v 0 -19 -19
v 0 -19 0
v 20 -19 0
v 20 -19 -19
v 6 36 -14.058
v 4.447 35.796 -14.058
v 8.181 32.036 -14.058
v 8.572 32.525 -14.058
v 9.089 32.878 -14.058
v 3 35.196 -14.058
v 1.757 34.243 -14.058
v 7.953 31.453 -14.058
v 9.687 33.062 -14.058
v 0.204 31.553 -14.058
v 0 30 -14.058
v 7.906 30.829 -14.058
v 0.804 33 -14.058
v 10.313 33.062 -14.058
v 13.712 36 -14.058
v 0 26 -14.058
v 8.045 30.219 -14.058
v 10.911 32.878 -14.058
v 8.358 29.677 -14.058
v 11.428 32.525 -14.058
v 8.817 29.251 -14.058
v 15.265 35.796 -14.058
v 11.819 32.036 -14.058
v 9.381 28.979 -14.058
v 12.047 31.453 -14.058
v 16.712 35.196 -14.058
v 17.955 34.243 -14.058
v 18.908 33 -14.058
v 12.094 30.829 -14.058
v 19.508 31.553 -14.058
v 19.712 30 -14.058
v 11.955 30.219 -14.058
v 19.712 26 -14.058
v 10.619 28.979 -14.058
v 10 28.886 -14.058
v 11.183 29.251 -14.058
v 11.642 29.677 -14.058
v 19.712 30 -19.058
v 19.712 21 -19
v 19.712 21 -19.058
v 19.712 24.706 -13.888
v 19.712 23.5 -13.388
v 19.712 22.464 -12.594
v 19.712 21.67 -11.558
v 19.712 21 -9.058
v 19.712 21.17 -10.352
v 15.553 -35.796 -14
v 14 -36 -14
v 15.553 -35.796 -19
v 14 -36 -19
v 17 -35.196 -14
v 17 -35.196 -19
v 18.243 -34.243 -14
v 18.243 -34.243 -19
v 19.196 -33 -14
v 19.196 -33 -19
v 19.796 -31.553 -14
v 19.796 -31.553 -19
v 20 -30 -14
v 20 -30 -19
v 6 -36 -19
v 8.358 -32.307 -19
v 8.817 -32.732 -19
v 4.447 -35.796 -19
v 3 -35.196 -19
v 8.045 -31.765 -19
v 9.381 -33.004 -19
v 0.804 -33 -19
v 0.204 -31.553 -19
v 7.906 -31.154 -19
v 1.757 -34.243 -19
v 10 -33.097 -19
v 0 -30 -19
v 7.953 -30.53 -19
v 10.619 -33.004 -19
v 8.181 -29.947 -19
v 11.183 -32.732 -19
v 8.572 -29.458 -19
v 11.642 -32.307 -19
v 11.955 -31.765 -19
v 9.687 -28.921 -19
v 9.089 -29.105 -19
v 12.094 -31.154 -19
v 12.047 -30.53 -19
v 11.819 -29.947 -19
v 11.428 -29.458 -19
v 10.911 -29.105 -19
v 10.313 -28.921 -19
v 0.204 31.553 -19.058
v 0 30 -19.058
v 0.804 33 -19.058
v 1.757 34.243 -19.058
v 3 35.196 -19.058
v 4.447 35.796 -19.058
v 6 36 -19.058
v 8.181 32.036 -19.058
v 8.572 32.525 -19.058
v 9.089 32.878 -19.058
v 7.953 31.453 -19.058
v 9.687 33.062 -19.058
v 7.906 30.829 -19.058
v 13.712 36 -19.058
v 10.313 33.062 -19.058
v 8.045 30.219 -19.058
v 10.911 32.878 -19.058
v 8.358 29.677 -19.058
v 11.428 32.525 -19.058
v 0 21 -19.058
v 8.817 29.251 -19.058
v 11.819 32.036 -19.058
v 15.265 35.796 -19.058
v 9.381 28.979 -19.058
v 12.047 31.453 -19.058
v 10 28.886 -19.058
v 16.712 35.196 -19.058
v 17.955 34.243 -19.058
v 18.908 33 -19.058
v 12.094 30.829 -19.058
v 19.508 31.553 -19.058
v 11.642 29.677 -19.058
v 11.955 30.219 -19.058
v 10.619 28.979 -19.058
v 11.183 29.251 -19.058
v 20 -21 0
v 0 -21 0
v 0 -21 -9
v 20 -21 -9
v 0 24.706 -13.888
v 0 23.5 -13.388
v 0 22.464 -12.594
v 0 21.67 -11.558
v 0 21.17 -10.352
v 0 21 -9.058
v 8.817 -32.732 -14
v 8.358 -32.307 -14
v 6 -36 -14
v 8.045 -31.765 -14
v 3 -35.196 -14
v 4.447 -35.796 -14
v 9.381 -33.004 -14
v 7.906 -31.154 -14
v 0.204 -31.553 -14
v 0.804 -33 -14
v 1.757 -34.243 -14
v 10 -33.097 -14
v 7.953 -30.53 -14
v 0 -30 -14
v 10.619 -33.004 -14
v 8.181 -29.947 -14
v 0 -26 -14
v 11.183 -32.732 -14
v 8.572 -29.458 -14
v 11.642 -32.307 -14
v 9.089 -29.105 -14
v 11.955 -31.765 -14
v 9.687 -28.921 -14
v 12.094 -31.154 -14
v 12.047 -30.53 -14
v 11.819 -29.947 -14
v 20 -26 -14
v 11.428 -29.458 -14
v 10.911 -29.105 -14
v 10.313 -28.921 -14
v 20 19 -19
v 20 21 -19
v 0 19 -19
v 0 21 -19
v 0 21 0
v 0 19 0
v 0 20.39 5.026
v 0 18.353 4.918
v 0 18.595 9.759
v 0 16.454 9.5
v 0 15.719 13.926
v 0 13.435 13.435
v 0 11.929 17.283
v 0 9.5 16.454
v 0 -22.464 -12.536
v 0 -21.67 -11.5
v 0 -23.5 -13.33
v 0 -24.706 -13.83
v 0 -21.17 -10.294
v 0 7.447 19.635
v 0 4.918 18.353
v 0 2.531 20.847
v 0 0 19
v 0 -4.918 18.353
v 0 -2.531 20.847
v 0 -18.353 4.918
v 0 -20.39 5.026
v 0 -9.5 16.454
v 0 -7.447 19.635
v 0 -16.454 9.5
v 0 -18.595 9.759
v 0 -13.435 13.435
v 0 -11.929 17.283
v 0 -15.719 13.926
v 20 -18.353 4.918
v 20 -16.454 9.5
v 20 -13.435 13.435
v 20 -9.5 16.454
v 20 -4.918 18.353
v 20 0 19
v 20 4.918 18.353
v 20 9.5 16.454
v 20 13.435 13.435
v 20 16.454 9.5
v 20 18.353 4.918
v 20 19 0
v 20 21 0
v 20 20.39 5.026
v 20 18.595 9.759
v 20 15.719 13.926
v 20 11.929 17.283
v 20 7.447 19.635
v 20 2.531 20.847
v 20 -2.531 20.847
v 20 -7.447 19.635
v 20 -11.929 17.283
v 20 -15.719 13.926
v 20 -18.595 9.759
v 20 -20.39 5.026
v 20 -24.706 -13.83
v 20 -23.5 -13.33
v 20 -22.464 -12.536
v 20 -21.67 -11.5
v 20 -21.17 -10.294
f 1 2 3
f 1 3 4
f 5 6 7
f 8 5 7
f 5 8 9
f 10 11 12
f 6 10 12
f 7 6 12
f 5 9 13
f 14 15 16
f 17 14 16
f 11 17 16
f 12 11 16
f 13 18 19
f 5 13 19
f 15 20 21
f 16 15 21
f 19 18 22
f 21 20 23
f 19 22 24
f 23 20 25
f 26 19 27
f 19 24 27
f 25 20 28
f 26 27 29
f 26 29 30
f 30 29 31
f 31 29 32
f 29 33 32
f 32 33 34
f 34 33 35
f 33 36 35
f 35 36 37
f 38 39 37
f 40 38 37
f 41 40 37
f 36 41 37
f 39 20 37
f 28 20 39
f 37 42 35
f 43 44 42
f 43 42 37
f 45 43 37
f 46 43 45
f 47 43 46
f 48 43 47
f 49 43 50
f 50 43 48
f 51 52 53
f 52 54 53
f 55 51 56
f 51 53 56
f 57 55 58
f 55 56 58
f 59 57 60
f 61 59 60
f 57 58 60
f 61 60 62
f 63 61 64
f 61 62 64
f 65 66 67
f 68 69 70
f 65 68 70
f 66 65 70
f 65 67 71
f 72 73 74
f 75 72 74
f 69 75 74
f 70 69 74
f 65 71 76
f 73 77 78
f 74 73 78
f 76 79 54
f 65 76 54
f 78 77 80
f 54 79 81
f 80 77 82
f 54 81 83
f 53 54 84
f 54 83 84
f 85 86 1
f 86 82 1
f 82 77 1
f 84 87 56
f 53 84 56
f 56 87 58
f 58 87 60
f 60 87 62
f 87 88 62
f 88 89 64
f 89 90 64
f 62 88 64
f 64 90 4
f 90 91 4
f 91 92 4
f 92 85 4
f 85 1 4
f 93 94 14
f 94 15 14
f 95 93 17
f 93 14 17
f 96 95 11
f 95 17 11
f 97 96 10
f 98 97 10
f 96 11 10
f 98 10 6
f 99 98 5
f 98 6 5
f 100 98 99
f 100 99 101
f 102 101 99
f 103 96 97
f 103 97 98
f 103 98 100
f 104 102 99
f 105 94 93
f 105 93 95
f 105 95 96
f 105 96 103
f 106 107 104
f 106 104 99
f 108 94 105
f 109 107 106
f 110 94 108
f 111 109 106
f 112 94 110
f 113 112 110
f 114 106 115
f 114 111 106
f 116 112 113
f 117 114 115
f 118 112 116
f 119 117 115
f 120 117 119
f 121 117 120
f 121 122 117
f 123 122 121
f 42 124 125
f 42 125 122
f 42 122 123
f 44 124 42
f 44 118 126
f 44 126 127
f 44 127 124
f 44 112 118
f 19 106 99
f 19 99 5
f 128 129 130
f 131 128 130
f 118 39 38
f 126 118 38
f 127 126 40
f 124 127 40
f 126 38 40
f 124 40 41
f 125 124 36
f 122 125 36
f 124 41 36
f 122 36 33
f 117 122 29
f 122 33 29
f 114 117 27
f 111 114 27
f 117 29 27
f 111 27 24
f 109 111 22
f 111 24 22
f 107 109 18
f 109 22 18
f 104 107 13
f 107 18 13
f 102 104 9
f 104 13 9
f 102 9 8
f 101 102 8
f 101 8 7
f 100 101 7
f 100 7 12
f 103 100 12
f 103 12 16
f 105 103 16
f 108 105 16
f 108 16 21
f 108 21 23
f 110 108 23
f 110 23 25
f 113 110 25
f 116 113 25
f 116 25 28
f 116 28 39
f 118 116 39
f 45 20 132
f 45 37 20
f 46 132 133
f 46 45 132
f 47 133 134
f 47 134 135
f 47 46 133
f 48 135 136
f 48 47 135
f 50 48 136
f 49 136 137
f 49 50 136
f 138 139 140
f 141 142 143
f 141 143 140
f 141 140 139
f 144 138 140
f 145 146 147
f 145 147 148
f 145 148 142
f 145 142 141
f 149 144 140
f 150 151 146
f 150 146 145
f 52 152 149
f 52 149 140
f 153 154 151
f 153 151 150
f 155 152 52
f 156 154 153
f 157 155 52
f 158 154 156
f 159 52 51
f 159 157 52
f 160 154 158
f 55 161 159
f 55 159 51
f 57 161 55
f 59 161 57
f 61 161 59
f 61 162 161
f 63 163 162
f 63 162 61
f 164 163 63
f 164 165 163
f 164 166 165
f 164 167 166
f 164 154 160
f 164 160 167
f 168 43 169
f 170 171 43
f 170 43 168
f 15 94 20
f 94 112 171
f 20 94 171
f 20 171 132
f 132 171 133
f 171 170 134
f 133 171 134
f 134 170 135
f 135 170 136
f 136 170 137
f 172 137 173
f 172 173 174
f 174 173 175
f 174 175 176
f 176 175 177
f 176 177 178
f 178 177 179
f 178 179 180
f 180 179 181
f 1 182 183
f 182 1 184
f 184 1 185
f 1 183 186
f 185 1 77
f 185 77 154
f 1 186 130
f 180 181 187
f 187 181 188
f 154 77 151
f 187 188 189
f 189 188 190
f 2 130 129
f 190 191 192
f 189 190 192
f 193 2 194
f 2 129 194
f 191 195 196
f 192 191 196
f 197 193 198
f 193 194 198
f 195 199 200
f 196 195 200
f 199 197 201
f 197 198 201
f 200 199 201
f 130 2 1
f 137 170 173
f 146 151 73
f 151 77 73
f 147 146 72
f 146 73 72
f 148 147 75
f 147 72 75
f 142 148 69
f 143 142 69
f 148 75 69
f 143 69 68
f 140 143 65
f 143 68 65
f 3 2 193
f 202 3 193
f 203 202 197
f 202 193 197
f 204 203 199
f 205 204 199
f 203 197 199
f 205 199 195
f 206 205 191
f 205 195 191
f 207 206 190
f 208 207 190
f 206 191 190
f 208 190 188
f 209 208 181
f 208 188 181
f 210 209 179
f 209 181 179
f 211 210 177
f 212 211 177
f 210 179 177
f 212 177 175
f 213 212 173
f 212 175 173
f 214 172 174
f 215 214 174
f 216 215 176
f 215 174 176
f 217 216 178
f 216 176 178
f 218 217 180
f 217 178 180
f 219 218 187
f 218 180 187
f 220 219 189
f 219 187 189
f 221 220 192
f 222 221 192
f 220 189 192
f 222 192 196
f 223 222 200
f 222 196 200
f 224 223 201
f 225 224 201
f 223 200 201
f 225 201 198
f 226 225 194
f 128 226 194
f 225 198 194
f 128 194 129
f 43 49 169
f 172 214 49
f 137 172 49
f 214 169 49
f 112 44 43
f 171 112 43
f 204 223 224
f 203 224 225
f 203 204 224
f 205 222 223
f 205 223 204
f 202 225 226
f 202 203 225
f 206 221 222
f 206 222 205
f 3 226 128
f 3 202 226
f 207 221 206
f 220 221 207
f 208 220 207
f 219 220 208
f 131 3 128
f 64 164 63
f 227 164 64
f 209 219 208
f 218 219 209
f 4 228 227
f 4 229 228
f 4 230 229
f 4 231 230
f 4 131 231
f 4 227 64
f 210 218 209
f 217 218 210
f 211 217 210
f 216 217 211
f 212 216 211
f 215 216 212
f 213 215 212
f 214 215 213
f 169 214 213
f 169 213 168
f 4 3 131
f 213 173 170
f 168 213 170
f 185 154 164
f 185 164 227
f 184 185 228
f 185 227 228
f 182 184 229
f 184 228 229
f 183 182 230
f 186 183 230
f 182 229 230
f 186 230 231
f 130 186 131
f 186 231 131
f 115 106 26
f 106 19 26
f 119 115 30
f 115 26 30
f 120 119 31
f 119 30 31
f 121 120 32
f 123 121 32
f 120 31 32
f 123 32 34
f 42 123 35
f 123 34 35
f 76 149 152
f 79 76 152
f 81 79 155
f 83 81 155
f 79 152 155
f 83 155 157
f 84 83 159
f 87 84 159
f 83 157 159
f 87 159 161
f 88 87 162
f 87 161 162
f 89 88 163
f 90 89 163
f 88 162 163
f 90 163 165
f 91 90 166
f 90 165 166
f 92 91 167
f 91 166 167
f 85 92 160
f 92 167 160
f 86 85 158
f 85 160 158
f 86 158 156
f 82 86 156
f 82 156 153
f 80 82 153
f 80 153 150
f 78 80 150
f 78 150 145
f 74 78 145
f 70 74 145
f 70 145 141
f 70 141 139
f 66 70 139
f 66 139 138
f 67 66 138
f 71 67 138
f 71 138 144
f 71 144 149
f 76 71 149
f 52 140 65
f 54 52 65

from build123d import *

# Parameters (mm, degrees)
PAD001_DEPTH    = 20
POCKET_DEPTH    = 20
SKETCH003_W     = 5
SKETCH003_H     = 20
PAD002_DEPTH    = 15
SKETCH004_W     = 5
SKETCH004_H     = 19.712328
PAD003_DEPTH    = 15
FILLET_R        = 5
FILLET001_R     = 5
SKETCH005_R     = 2.1
POCKET001_DEPTH = 7
FILLET002_R     = 6


with BuildPart() as part:
    # Sketch001 → Pad001 (new body)
    with BuildSketch(Plane.YZ):
        with BuildLine():
            ThreePointArc((21, 0), (0, 21), (-21, 0))
            Line((-21, 0), (-21, -19))
            Line((21, -19), (-21, -19))
            Line((21, 0), (21, -19))
        make_face()
    extrude(amount=PAD001_DEPTH)

    # Sketch002 (on Face5 of Pad001) → Pocket (cut)
    with BuildSketch(Plane(origin=(0, 0, 0), x_dir=(0, 1, 0), z_dir=(-1, 0, 0))):
        with BuildLine():
            ThreePointArc((-19, 0), (0, -19), (19, 0))
            Line((19, 0), (19, 19))
            Line((-19, 19), (19, 19))
            Line((-19, 0), (-19, 19))
        make_face()
    extrude(amount=-POCKET_DEPTH, mode=Mode.SUBTRACT)

    # Sketch003 (on Face3 of Pocket) → Pad002 (join)
    with BuildSketch(Plane(origin=(0, -21, 0), x_dir=(0, 0, -1), z_dir=(0, -1, 0))):
        with Locations((16.5, 10)):
            Rectangle(SKETCH003_W, SKETCH003_H)
    extrude(amount=PAD002_DEPTH)

    # Sketch004 (on Face2 of Pad002) → Pad003 (join)
    with BuildSketch(Plane.ZX.offset(21)):
        with Locations((-16.558334, 9.856164)):
            Rectangle(SKETCH004_W, SKETCH004_H)
    extrude(amount=PAD003_DEPTH)

    # Fillet
    fillet_edges = [part.edges().sort_by_distance(p)[0] for p in [
        (9.856164, 21, -14.058334),
    ]]
    fillet(fillet_edges, radius=FILLET_R)

    # Fillet001
    fillet001_edges = [part.edges().sort_by_distance(p)[0] for p in [
        (10, -21, -14),
    ]]
    fillet(fillet001_edges, radius=FILLET001_R)

    # Sketch005 (on Face14 of Fillet001) → Pocket001 (cut)
    with BuildSketch(Plane(origin=(0, 0, -14), x_dir=(0, -1, 0), z_dir=(0, 0, 1))):
        with Locations((30.997393, 10)):
            Circle(SKETCH005_R)
        with Locations((-30.985943, 10)):
            Circle(SKETCH005_R)
    extrude(amount=-POCKET001_DEPTH, mode=Mode.SUBTRACT)

    # Fillet002
    fillet002_edges = [part.edges().sort_by_distance(p)[0] for p in [
        (0, 36, -16.558334),
        (19.712328, 36, -16.558334),
        (0, -36, -16.5),
        (20, -36, -16.5),
    ]]
    fillet(fillet002_edges, radius=FILLET002_R)


solid = part.part
